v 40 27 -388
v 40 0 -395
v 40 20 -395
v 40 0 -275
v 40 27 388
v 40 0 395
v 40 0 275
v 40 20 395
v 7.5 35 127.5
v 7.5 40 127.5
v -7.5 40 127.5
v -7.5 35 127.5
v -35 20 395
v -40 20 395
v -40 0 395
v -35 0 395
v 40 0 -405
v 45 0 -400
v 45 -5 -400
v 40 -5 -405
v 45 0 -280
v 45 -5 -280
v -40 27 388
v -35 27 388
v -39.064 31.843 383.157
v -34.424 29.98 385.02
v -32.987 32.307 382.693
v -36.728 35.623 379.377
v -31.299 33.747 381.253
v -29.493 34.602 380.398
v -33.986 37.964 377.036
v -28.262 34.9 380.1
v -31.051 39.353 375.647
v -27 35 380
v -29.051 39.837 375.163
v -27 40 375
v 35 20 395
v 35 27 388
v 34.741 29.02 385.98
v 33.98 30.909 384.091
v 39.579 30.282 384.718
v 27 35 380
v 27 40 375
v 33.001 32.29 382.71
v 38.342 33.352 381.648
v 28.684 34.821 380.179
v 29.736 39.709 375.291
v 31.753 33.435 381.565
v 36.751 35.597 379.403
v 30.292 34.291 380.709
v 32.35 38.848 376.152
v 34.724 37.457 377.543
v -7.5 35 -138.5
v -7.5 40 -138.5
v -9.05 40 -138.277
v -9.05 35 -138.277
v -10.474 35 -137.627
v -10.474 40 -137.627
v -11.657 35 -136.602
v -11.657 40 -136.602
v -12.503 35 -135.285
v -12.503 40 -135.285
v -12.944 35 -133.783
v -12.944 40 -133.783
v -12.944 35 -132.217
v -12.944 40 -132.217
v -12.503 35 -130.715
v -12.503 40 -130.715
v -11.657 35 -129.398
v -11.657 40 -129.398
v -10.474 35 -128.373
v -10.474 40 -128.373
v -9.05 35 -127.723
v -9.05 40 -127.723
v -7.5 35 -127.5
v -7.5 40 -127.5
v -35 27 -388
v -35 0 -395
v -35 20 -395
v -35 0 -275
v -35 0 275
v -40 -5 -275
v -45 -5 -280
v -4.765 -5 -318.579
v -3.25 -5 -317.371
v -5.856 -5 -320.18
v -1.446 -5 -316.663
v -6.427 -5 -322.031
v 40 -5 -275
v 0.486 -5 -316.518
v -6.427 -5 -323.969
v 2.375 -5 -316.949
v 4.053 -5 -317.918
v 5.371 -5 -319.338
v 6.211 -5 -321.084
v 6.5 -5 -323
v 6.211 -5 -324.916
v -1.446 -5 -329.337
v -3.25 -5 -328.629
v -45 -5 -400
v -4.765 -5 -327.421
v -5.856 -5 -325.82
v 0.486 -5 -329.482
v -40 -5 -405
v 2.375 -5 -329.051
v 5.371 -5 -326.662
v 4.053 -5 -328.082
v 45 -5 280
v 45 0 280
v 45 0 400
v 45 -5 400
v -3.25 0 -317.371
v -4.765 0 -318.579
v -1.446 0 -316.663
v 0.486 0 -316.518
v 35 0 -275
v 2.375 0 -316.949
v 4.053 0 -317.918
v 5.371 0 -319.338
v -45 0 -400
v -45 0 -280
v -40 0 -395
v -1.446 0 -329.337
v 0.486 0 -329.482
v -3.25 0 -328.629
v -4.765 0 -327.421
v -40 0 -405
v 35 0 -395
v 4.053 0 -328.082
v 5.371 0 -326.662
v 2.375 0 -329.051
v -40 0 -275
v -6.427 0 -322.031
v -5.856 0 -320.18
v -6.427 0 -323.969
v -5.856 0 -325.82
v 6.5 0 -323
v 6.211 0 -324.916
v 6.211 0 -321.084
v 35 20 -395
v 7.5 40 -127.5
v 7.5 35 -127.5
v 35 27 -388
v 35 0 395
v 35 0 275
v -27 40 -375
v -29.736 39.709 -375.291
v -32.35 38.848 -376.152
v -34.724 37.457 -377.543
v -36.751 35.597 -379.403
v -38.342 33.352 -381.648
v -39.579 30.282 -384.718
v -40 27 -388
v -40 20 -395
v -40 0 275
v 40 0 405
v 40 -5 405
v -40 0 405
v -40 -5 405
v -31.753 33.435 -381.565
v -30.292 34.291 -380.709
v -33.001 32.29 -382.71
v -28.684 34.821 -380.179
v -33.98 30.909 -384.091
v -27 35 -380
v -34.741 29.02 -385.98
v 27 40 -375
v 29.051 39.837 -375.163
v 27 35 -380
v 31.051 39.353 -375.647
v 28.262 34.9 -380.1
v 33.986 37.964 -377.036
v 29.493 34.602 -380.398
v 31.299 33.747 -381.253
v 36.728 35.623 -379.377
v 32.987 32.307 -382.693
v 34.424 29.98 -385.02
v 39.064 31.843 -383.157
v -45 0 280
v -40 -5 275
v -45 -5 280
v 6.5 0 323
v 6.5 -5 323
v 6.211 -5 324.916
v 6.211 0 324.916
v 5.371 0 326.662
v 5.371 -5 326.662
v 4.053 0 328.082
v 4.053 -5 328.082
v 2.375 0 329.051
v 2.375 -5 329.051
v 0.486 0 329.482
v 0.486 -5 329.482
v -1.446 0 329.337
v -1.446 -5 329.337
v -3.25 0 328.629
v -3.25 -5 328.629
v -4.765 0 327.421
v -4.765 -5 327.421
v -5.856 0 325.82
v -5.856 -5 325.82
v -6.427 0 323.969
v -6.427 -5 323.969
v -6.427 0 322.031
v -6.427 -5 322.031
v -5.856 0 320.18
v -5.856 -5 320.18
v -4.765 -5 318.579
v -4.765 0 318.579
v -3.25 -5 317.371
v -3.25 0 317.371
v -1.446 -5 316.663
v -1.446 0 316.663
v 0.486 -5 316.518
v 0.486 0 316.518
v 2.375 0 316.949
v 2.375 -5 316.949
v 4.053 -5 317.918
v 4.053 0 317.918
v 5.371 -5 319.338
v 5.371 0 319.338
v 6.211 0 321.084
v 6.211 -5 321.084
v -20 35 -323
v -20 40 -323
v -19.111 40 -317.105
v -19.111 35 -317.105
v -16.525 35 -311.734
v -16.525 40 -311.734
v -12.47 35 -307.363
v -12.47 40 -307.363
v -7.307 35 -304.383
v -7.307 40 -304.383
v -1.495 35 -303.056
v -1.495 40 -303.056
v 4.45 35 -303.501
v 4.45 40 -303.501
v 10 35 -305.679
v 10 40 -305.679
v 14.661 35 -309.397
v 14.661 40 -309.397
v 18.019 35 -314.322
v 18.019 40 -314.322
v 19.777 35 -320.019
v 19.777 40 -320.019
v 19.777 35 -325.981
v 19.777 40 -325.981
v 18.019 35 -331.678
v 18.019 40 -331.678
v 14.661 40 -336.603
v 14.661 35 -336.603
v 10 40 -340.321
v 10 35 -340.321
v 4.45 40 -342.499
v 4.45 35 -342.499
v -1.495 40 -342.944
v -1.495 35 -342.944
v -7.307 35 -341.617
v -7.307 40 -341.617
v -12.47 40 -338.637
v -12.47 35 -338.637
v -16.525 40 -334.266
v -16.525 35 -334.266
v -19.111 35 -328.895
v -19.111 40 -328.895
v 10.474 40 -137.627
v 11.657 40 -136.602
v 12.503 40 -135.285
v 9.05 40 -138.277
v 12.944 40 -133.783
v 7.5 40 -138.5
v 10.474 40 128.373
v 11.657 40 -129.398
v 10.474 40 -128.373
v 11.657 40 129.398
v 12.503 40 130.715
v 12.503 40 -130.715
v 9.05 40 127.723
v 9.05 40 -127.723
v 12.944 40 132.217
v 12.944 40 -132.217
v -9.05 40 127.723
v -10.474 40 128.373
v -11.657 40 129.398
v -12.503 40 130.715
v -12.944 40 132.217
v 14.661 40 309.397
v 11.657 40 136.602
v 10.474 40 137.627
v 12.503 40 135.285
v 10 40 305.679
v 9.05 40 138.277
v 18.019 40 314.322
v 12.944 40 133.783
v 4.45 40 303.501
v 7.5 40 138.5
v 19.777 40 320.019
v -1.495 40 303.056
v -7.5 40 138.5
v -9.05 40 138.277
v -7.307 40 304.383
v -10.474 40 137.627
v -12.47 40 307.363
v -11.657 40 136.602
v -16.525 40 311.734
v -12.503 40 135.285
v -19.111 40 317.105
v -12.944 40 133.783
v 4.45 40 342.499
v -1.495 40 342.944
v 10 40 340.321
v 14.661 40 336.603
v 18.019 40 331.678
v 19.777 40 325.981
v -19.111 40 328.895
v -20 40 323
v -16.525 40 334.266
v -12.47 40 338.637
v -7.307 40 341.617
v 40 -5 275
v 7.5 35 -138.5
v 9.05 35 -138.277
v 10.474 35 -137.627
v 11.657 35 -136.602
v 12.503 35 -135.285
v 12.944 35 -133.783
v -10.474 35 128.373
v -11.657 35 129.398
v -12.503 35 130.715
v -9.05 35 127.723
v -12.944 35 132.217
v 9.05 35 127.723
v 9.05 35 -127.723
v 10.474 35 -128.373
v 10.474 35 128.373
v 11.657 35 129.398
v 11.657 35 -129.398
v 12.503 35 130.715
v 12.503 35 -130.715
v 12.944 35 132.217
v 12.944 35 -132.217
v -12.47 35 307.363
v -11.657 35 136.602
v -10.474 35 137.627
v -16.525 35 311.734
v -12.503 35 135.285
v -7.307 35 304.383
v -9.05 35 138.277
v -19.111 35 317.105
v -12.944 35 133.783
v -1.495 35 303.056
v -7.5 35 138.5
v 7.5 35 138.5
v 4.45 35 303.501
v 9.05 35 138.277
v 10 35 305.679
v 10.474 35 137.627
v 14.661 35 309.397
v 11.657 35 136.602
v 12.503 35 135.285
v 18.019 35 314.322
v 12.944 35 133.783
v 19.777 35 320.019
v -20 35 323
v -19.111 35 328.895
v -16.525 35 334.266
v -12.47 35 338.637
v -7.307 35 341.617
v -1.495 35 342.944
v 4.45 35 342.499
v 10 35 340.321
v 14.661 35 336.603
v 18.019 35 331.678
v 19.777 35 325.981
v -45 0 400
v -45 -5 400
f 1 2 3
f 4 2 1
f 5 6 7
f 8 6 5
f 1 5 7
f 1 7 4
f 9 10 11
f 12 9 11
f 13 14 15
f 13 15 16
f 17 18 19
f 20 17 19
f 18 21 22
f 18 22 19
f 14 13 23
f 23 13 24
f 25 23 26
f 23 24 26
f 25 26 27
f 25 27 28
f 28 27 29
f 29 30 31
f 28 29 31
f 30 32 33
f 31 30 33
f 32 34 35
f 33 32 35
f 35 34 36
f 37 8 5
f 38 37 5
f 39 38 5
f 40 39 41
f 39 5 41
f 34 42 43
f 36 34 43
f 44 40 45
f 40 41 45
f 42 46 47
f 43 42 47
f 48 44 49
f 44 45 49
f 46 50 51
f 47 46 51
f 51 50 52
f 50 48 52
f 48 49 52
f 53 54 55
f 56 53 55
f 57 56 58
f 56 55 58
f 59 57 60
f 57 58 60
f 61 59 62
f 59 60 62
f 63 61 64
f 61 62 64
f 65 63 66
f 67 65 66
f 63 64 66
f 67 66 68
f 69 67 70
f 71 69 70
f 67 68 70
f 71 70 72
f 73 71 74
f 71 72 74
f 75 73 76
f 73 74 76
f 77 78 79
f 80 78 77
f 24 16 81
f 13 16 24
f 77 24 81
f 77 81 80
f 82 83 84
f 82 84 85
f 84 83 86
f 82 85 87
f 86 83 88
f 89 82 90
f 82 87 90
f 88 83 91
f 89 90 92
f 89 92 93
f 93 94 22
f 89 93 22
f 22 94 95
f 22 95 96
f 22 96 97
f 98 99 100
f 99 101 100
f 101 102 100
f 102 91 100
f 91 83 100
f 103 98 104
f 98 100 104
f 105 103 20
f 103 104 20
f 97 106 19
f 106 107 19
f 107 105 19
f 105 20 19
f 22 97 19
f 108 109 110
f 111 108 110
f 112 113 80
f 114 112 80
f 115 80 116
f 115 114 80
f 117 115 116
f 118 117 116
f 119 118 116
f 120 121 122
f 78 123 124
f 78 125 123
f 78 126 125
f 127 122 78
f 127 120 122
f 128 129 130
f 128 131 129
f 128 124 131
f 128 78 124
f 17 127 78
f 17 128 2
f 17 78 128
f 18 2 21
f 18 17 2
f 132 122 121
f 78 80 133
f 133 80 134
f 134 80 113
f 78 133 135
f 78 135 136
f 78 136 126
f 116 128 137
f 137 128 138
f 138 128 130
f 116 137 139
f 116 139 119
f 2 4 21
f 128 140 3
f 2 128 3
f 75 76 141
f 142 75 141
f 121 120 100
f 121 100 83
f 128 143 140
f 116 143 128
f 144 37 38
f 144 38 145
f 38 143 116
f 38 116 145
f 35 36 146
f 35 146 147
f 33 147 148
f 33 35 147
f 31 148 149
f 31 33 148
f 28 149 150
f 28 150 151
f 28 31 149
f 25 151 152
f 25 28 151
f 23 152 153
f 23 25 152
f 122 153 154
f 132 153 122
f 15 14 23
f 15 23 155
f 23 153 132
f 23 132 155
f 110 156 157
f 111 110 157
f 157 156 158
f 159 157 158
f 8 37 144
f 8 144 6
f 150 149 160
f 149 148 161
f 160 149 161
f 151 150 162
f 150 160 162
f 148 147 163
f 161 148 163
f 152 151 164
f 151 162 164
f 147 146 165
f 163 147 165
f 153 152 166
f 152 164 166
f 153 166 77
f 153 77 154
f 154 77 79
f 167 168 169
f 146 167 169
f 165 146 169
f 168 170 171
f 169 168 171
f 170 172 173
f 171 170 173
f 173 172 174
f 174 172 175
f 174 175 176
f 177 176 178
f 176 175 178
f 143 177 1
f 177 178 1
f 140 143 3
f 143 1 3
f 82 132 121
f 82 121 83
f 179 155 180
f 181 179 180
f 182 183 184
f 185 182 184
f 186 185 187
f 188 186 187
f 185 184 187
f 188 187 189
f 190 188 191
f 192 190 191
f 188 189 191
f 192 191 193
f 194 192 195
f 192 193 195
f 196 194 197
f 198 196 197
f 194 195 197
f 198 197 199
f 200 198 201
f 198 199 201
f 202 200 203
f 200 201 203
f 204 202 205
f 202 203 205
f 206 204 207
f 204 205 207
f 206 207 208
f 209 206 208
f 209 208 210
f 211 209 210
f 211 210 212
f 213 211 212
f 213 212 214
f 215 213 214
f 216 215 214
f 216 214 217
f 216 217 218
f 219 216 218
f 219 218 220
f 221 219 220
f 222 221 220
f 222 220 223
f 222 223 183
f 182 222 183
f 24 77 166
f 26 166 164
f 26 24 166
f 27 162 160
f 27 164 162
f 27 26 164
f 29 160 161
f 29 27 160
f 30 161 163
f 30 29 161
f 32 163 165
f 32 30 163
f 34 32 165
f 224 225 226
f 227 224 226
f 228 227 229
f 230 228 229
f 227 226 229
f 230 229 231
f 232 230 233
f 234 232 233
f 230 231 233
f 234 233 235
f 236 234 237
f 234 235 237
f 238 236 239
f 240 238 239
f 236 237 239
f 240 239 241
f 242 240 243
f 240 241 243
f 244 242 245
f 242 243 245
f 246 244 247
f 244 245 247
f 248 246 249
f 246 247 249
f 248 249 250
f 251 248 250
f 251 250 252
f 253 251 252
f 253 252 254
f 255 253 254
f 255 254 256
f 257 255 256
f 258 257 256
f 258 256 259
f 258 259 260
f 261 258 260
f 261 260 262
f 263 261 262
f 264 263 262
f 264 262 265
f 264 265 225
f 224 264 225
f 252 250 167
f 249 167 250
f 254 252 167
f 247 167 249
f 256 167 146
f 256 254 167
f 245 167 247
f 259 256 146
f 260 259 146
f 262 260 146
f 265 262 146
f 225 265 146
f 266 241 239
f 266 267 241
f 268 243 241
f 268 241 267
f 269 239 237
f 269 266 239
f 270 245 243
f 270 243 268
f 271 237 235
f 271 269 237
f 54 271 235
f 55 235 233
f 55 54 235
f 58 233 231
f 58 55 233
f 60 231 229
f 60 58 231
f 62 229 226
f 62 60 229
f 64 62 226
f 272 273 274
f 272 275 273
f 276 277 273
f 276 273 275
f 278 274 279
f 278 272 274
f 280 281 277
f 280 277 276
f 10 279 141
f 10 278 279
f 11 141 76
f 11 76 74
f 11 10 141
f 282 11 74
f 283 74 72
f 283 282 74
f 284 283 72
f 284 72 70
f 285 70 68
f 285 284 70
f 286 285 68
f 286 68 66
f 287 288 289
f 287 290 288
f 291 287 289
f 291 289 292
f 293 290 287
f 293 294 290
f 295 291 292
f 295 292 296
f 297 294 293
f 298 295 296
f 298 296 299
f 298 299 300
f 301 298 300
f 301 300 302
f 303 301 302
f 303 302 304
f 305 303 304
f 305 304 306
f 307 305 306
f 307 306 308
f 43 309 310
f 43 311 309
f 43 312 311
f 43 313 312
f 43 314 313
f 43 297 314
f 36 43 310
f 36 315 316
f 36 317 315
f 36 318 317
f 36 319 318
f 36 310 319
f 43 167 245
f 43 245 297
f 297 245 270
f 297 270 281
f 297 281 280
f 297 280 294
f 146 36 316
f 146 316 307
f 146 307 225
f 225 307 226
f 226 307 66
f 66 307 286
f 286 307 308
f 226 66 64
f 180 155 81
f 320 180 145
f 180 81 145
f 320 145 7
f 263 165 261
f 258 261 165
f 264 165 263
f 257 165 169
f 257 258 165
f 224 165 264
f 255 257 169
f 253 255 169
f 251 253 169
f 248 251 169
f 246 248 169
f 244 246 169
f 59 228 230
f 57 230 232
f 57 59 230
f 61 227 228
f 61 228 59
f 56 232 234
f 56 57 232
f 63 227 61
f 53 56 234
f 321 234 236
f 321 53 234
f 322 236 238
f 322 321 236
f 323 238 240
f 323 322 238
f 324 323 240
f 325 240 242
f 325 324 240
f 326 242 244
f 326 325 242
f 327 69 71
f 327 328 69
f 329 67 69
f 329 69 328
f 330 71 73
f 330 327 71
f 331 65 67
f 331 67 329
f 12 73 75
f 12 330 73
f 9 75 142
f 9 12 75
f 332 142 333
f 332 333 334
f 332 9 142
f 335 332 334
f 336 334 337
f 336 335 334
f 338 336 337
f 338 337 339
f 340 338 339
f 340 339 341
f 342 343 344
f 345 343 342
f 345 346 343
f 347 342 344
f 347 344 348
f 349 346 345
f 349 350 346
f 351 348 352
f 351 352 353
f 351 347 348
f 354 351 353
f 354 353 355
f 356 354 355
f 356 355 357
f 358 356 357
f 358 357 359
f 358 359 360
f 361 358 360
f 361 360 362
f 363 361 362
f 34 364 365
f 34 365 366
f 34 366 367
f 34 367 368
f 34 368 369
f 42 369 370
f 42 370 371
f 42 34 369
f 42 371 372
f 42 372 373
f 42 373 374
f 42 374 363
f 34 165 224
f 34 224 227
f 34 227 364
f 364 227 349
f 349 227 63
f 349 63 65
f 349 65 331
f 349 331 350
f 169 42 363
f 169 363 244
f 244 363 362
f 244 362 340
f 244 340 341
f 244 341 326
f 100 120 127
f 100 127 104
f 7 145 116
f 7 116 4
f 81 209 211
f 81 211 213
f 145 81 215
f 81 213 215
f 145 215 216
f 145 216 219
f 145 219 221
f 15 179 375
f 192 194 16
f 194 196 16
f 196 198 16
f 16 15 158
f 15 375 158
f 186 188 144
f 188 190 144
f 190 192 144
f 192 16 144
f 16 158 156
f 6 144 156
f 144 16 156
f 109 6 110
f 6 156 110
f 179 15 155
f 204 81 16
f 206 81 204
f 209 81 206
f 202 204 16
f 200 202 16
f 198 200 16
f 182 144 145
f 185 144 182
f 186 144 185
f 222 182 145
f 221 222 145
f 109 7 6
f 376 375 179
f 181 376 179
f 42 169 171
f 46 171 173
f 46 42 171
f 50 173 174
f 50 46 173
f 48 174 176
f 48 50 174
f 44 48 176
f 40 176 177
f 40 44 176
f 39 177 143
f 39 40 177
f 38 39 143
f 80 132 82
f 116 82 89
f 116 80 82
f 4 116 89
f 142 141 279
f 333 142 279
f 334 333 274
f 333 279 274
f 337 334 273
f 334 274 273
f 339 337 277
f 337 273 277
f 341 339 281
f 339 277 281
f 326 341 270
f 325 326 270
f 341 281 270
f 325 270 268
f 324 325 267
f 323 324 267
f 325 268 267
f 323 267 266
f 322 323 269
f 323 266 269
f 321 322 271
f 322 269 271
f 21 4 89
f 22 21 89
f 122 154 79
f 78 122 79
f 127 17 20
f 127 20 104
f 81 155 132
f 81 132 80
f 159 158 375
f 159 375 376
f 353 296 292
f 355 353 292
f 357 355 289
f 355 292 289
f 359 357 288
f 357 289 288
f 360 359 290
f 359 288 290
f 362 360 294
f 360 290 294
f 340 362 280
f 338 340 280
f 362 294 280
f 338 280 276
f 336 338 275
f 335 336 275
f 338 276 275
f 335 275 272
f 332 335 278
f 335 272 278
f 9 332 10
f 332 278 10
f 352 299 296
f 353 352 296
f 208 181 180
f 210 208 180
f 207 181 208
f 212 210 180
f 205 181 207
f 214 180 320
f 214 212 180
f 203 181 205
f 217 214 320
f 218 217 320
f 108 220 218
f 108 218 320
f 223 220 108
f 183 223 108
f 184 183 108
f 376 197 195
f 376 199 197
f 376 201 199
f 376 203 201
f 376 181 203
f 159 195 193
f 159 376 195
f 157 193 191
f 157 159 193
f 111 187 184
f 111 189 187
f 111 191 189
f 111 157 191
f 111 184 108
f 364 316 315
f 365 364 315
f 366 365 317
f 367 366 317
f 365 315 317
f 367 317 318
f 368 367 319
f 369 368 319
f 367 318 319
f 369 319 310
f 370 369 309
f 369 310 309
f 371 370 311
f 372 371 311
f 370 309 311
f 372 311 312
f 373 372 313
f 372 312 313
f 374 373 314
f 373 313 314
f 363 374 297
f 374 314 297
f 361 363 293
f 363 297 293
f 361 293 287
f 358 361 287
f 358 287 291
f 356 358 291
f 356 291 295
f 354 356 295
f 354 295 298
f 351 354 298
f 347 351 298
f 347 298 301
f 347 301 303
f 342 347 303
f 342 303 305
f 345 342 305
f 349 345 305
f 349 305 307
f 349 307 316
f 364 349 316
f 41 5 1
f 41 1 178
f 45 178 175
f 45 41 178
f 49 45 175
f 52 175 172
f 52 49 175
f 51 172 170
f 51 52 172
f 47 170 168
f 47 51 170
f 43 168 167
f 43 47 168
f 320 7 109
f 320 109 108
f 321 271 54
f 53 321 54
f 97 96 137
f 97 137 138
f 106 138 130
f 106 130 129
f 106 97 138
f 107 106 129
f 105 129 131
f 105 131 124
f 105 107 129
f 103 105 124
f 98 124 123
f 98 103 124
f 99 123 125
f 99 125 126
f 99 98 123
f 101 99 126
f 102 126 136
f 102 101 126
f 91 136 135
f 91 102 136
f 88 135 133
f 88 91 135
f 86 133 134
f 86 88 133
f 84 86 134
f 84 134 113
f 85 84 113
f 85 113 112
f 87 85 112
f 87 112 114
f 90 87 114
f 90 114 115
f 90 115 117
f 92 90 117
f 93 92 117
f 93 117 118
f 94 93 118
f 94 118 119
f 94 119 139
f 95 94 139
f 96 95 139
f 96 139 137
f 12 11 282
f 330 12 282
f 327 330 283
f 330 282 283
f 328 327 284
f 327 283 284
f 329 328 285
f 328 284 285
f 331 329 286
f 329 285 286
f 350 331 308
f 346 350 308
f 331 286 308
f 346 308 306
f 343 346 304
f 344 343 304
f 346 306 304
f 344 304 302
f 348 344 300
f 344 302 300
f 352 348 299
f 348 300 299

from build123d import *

# Parameters (mm, degrees)
F1_DEPTH  = 395
F2_R      = 20
F3_DEPTH  = 40.001
F4_W      = 5
F4_H      = 120
F5_DEPTH  = 5
F6_SIZE   = 5
F7_R      = 6.5
F8_DEPTH  = 45.001
F11_DEPTH = 85.001


with BuildPart() as f1:
    # F0 (on Top) → F1 (new body, symmetric)
    with BuildSketch(Plane.XY):
        with BuildLine():
            Line((27, 40), (-27, 40))
            ThreePointArc((-27, 40), (-36.1923881554, 36.1923881554), (-40, 27))
            Line((-40, 27), (-40, 0))
            Line((-40, 0), (-35, 0))
            Line((-35, 0), (-35, 27))
            ThreePointArc((-35, 27), (-32.6568542495, 32.6568542495), (-27, 35))
            Line((-27, 35), (27, 35))
            ThreePointArc((27, 35), (32.6568542495, 32.6568542495), (35, 27))
            Line((35, 27), (35, 0))
            Line((35, 0), (40, 0))
            Line((40, 0), (40, 27))
            ThreePointArc((40, 27), (36.1923881554, 36.1923881554), (27, 40))
        make_face()
    extrude(amount=F1_DEPTH, both=True)

    # F2 (on face) → F3 (cut, through all)
    with BuildSketch(Plane(origin=(0, 40, 0), x_dir=(-1, 0, 0), z_dir=(0, 1, 0))):
        with Locations((0, 323)):
            Circle(F2_R)
        with BuildLine():
            Line((-7.5, 127.5), (7.5, 127.5))
            ThreePointArc((7.5, 127.5), (13, 133), (7.5, 138.5))
            Line((7.5, 138.5), (-7.5, 138.5))
            ThreePointArc((-7.5, 138.5), (-13, 133), (-7.5, 127.5))
        make_face()
        with BuildLine():
            ThreePointArc((-7.5, -127.5), (-13, -133), (-7.5, -138.5))
            Line((-7.5, -138.5), (7.5, -138.5))
            ThreePointArc((7.5, -138.5), (13, -133), (7.5, -127.5))
            Line((7.5, -127.5), (-7.5, -127.5))
        make_face()
        with Locations((0, -323)):
            Circle(F2_R)
    extrude(amount=-F3_DEPTH, mode=Mode.SUBTRACT)

    # F4 (on face) → F5 (join)
    with BuildSketch(Plane.XZ):
        Polygon((45, 405), (-45, 405), (-45, 275), (-40, 275), (-40, 395), (-35, 395), (-35, 275), (45, 275), align=None)
        with Locations((-37.5, 335)):
            Rectangle(F4_W, F4_H)
    extrude(amount=F5_DEPTH)

    # F6
    f6_edges = [f1.edges().sort_by_distance(p)[0] for p in [
        (45, -2.5, 275),
        (-45, -2.5, 275),
        (-45, -2.5, 405),
        (45, -2.5, 405),
    ]]
    chamfer(f6_edges, length=F6_SIZE)

    # F7 (on face) → F8 (cut, through all)
    with BuildSketch(Plane.XZ.offset(5)):
        with Locations((0, 323)):
            Circle(F7_R)
    extrude(amount=-F8_DEPTH, mode=Mode.SUBTRACT)

    # F9: F1 across plane


with BuildPart() as f1_1:
    add(f1.part)
    add(f1.part.mirror(Plane.XY))

    # F10 (on face) → F11 (cut, through all)
    with BuildSketch(Plane.YZ.offset(40)):
        Polygon((27, 388), (27, 395), (20, 395), align=None)
        Polygon((40, 375), (40, 395), (27, 395), (27, 388), align=None)
        Polygon((27, -395), (27, -388), (20, -395), align=None)
        Polygon((40, -375), (27, -388), (27, -395), (40, -395), align=None)
    extrude(amount=-F11_DEPTH, mode=Mode.SUBTRACT)


solid = f1_1.part
